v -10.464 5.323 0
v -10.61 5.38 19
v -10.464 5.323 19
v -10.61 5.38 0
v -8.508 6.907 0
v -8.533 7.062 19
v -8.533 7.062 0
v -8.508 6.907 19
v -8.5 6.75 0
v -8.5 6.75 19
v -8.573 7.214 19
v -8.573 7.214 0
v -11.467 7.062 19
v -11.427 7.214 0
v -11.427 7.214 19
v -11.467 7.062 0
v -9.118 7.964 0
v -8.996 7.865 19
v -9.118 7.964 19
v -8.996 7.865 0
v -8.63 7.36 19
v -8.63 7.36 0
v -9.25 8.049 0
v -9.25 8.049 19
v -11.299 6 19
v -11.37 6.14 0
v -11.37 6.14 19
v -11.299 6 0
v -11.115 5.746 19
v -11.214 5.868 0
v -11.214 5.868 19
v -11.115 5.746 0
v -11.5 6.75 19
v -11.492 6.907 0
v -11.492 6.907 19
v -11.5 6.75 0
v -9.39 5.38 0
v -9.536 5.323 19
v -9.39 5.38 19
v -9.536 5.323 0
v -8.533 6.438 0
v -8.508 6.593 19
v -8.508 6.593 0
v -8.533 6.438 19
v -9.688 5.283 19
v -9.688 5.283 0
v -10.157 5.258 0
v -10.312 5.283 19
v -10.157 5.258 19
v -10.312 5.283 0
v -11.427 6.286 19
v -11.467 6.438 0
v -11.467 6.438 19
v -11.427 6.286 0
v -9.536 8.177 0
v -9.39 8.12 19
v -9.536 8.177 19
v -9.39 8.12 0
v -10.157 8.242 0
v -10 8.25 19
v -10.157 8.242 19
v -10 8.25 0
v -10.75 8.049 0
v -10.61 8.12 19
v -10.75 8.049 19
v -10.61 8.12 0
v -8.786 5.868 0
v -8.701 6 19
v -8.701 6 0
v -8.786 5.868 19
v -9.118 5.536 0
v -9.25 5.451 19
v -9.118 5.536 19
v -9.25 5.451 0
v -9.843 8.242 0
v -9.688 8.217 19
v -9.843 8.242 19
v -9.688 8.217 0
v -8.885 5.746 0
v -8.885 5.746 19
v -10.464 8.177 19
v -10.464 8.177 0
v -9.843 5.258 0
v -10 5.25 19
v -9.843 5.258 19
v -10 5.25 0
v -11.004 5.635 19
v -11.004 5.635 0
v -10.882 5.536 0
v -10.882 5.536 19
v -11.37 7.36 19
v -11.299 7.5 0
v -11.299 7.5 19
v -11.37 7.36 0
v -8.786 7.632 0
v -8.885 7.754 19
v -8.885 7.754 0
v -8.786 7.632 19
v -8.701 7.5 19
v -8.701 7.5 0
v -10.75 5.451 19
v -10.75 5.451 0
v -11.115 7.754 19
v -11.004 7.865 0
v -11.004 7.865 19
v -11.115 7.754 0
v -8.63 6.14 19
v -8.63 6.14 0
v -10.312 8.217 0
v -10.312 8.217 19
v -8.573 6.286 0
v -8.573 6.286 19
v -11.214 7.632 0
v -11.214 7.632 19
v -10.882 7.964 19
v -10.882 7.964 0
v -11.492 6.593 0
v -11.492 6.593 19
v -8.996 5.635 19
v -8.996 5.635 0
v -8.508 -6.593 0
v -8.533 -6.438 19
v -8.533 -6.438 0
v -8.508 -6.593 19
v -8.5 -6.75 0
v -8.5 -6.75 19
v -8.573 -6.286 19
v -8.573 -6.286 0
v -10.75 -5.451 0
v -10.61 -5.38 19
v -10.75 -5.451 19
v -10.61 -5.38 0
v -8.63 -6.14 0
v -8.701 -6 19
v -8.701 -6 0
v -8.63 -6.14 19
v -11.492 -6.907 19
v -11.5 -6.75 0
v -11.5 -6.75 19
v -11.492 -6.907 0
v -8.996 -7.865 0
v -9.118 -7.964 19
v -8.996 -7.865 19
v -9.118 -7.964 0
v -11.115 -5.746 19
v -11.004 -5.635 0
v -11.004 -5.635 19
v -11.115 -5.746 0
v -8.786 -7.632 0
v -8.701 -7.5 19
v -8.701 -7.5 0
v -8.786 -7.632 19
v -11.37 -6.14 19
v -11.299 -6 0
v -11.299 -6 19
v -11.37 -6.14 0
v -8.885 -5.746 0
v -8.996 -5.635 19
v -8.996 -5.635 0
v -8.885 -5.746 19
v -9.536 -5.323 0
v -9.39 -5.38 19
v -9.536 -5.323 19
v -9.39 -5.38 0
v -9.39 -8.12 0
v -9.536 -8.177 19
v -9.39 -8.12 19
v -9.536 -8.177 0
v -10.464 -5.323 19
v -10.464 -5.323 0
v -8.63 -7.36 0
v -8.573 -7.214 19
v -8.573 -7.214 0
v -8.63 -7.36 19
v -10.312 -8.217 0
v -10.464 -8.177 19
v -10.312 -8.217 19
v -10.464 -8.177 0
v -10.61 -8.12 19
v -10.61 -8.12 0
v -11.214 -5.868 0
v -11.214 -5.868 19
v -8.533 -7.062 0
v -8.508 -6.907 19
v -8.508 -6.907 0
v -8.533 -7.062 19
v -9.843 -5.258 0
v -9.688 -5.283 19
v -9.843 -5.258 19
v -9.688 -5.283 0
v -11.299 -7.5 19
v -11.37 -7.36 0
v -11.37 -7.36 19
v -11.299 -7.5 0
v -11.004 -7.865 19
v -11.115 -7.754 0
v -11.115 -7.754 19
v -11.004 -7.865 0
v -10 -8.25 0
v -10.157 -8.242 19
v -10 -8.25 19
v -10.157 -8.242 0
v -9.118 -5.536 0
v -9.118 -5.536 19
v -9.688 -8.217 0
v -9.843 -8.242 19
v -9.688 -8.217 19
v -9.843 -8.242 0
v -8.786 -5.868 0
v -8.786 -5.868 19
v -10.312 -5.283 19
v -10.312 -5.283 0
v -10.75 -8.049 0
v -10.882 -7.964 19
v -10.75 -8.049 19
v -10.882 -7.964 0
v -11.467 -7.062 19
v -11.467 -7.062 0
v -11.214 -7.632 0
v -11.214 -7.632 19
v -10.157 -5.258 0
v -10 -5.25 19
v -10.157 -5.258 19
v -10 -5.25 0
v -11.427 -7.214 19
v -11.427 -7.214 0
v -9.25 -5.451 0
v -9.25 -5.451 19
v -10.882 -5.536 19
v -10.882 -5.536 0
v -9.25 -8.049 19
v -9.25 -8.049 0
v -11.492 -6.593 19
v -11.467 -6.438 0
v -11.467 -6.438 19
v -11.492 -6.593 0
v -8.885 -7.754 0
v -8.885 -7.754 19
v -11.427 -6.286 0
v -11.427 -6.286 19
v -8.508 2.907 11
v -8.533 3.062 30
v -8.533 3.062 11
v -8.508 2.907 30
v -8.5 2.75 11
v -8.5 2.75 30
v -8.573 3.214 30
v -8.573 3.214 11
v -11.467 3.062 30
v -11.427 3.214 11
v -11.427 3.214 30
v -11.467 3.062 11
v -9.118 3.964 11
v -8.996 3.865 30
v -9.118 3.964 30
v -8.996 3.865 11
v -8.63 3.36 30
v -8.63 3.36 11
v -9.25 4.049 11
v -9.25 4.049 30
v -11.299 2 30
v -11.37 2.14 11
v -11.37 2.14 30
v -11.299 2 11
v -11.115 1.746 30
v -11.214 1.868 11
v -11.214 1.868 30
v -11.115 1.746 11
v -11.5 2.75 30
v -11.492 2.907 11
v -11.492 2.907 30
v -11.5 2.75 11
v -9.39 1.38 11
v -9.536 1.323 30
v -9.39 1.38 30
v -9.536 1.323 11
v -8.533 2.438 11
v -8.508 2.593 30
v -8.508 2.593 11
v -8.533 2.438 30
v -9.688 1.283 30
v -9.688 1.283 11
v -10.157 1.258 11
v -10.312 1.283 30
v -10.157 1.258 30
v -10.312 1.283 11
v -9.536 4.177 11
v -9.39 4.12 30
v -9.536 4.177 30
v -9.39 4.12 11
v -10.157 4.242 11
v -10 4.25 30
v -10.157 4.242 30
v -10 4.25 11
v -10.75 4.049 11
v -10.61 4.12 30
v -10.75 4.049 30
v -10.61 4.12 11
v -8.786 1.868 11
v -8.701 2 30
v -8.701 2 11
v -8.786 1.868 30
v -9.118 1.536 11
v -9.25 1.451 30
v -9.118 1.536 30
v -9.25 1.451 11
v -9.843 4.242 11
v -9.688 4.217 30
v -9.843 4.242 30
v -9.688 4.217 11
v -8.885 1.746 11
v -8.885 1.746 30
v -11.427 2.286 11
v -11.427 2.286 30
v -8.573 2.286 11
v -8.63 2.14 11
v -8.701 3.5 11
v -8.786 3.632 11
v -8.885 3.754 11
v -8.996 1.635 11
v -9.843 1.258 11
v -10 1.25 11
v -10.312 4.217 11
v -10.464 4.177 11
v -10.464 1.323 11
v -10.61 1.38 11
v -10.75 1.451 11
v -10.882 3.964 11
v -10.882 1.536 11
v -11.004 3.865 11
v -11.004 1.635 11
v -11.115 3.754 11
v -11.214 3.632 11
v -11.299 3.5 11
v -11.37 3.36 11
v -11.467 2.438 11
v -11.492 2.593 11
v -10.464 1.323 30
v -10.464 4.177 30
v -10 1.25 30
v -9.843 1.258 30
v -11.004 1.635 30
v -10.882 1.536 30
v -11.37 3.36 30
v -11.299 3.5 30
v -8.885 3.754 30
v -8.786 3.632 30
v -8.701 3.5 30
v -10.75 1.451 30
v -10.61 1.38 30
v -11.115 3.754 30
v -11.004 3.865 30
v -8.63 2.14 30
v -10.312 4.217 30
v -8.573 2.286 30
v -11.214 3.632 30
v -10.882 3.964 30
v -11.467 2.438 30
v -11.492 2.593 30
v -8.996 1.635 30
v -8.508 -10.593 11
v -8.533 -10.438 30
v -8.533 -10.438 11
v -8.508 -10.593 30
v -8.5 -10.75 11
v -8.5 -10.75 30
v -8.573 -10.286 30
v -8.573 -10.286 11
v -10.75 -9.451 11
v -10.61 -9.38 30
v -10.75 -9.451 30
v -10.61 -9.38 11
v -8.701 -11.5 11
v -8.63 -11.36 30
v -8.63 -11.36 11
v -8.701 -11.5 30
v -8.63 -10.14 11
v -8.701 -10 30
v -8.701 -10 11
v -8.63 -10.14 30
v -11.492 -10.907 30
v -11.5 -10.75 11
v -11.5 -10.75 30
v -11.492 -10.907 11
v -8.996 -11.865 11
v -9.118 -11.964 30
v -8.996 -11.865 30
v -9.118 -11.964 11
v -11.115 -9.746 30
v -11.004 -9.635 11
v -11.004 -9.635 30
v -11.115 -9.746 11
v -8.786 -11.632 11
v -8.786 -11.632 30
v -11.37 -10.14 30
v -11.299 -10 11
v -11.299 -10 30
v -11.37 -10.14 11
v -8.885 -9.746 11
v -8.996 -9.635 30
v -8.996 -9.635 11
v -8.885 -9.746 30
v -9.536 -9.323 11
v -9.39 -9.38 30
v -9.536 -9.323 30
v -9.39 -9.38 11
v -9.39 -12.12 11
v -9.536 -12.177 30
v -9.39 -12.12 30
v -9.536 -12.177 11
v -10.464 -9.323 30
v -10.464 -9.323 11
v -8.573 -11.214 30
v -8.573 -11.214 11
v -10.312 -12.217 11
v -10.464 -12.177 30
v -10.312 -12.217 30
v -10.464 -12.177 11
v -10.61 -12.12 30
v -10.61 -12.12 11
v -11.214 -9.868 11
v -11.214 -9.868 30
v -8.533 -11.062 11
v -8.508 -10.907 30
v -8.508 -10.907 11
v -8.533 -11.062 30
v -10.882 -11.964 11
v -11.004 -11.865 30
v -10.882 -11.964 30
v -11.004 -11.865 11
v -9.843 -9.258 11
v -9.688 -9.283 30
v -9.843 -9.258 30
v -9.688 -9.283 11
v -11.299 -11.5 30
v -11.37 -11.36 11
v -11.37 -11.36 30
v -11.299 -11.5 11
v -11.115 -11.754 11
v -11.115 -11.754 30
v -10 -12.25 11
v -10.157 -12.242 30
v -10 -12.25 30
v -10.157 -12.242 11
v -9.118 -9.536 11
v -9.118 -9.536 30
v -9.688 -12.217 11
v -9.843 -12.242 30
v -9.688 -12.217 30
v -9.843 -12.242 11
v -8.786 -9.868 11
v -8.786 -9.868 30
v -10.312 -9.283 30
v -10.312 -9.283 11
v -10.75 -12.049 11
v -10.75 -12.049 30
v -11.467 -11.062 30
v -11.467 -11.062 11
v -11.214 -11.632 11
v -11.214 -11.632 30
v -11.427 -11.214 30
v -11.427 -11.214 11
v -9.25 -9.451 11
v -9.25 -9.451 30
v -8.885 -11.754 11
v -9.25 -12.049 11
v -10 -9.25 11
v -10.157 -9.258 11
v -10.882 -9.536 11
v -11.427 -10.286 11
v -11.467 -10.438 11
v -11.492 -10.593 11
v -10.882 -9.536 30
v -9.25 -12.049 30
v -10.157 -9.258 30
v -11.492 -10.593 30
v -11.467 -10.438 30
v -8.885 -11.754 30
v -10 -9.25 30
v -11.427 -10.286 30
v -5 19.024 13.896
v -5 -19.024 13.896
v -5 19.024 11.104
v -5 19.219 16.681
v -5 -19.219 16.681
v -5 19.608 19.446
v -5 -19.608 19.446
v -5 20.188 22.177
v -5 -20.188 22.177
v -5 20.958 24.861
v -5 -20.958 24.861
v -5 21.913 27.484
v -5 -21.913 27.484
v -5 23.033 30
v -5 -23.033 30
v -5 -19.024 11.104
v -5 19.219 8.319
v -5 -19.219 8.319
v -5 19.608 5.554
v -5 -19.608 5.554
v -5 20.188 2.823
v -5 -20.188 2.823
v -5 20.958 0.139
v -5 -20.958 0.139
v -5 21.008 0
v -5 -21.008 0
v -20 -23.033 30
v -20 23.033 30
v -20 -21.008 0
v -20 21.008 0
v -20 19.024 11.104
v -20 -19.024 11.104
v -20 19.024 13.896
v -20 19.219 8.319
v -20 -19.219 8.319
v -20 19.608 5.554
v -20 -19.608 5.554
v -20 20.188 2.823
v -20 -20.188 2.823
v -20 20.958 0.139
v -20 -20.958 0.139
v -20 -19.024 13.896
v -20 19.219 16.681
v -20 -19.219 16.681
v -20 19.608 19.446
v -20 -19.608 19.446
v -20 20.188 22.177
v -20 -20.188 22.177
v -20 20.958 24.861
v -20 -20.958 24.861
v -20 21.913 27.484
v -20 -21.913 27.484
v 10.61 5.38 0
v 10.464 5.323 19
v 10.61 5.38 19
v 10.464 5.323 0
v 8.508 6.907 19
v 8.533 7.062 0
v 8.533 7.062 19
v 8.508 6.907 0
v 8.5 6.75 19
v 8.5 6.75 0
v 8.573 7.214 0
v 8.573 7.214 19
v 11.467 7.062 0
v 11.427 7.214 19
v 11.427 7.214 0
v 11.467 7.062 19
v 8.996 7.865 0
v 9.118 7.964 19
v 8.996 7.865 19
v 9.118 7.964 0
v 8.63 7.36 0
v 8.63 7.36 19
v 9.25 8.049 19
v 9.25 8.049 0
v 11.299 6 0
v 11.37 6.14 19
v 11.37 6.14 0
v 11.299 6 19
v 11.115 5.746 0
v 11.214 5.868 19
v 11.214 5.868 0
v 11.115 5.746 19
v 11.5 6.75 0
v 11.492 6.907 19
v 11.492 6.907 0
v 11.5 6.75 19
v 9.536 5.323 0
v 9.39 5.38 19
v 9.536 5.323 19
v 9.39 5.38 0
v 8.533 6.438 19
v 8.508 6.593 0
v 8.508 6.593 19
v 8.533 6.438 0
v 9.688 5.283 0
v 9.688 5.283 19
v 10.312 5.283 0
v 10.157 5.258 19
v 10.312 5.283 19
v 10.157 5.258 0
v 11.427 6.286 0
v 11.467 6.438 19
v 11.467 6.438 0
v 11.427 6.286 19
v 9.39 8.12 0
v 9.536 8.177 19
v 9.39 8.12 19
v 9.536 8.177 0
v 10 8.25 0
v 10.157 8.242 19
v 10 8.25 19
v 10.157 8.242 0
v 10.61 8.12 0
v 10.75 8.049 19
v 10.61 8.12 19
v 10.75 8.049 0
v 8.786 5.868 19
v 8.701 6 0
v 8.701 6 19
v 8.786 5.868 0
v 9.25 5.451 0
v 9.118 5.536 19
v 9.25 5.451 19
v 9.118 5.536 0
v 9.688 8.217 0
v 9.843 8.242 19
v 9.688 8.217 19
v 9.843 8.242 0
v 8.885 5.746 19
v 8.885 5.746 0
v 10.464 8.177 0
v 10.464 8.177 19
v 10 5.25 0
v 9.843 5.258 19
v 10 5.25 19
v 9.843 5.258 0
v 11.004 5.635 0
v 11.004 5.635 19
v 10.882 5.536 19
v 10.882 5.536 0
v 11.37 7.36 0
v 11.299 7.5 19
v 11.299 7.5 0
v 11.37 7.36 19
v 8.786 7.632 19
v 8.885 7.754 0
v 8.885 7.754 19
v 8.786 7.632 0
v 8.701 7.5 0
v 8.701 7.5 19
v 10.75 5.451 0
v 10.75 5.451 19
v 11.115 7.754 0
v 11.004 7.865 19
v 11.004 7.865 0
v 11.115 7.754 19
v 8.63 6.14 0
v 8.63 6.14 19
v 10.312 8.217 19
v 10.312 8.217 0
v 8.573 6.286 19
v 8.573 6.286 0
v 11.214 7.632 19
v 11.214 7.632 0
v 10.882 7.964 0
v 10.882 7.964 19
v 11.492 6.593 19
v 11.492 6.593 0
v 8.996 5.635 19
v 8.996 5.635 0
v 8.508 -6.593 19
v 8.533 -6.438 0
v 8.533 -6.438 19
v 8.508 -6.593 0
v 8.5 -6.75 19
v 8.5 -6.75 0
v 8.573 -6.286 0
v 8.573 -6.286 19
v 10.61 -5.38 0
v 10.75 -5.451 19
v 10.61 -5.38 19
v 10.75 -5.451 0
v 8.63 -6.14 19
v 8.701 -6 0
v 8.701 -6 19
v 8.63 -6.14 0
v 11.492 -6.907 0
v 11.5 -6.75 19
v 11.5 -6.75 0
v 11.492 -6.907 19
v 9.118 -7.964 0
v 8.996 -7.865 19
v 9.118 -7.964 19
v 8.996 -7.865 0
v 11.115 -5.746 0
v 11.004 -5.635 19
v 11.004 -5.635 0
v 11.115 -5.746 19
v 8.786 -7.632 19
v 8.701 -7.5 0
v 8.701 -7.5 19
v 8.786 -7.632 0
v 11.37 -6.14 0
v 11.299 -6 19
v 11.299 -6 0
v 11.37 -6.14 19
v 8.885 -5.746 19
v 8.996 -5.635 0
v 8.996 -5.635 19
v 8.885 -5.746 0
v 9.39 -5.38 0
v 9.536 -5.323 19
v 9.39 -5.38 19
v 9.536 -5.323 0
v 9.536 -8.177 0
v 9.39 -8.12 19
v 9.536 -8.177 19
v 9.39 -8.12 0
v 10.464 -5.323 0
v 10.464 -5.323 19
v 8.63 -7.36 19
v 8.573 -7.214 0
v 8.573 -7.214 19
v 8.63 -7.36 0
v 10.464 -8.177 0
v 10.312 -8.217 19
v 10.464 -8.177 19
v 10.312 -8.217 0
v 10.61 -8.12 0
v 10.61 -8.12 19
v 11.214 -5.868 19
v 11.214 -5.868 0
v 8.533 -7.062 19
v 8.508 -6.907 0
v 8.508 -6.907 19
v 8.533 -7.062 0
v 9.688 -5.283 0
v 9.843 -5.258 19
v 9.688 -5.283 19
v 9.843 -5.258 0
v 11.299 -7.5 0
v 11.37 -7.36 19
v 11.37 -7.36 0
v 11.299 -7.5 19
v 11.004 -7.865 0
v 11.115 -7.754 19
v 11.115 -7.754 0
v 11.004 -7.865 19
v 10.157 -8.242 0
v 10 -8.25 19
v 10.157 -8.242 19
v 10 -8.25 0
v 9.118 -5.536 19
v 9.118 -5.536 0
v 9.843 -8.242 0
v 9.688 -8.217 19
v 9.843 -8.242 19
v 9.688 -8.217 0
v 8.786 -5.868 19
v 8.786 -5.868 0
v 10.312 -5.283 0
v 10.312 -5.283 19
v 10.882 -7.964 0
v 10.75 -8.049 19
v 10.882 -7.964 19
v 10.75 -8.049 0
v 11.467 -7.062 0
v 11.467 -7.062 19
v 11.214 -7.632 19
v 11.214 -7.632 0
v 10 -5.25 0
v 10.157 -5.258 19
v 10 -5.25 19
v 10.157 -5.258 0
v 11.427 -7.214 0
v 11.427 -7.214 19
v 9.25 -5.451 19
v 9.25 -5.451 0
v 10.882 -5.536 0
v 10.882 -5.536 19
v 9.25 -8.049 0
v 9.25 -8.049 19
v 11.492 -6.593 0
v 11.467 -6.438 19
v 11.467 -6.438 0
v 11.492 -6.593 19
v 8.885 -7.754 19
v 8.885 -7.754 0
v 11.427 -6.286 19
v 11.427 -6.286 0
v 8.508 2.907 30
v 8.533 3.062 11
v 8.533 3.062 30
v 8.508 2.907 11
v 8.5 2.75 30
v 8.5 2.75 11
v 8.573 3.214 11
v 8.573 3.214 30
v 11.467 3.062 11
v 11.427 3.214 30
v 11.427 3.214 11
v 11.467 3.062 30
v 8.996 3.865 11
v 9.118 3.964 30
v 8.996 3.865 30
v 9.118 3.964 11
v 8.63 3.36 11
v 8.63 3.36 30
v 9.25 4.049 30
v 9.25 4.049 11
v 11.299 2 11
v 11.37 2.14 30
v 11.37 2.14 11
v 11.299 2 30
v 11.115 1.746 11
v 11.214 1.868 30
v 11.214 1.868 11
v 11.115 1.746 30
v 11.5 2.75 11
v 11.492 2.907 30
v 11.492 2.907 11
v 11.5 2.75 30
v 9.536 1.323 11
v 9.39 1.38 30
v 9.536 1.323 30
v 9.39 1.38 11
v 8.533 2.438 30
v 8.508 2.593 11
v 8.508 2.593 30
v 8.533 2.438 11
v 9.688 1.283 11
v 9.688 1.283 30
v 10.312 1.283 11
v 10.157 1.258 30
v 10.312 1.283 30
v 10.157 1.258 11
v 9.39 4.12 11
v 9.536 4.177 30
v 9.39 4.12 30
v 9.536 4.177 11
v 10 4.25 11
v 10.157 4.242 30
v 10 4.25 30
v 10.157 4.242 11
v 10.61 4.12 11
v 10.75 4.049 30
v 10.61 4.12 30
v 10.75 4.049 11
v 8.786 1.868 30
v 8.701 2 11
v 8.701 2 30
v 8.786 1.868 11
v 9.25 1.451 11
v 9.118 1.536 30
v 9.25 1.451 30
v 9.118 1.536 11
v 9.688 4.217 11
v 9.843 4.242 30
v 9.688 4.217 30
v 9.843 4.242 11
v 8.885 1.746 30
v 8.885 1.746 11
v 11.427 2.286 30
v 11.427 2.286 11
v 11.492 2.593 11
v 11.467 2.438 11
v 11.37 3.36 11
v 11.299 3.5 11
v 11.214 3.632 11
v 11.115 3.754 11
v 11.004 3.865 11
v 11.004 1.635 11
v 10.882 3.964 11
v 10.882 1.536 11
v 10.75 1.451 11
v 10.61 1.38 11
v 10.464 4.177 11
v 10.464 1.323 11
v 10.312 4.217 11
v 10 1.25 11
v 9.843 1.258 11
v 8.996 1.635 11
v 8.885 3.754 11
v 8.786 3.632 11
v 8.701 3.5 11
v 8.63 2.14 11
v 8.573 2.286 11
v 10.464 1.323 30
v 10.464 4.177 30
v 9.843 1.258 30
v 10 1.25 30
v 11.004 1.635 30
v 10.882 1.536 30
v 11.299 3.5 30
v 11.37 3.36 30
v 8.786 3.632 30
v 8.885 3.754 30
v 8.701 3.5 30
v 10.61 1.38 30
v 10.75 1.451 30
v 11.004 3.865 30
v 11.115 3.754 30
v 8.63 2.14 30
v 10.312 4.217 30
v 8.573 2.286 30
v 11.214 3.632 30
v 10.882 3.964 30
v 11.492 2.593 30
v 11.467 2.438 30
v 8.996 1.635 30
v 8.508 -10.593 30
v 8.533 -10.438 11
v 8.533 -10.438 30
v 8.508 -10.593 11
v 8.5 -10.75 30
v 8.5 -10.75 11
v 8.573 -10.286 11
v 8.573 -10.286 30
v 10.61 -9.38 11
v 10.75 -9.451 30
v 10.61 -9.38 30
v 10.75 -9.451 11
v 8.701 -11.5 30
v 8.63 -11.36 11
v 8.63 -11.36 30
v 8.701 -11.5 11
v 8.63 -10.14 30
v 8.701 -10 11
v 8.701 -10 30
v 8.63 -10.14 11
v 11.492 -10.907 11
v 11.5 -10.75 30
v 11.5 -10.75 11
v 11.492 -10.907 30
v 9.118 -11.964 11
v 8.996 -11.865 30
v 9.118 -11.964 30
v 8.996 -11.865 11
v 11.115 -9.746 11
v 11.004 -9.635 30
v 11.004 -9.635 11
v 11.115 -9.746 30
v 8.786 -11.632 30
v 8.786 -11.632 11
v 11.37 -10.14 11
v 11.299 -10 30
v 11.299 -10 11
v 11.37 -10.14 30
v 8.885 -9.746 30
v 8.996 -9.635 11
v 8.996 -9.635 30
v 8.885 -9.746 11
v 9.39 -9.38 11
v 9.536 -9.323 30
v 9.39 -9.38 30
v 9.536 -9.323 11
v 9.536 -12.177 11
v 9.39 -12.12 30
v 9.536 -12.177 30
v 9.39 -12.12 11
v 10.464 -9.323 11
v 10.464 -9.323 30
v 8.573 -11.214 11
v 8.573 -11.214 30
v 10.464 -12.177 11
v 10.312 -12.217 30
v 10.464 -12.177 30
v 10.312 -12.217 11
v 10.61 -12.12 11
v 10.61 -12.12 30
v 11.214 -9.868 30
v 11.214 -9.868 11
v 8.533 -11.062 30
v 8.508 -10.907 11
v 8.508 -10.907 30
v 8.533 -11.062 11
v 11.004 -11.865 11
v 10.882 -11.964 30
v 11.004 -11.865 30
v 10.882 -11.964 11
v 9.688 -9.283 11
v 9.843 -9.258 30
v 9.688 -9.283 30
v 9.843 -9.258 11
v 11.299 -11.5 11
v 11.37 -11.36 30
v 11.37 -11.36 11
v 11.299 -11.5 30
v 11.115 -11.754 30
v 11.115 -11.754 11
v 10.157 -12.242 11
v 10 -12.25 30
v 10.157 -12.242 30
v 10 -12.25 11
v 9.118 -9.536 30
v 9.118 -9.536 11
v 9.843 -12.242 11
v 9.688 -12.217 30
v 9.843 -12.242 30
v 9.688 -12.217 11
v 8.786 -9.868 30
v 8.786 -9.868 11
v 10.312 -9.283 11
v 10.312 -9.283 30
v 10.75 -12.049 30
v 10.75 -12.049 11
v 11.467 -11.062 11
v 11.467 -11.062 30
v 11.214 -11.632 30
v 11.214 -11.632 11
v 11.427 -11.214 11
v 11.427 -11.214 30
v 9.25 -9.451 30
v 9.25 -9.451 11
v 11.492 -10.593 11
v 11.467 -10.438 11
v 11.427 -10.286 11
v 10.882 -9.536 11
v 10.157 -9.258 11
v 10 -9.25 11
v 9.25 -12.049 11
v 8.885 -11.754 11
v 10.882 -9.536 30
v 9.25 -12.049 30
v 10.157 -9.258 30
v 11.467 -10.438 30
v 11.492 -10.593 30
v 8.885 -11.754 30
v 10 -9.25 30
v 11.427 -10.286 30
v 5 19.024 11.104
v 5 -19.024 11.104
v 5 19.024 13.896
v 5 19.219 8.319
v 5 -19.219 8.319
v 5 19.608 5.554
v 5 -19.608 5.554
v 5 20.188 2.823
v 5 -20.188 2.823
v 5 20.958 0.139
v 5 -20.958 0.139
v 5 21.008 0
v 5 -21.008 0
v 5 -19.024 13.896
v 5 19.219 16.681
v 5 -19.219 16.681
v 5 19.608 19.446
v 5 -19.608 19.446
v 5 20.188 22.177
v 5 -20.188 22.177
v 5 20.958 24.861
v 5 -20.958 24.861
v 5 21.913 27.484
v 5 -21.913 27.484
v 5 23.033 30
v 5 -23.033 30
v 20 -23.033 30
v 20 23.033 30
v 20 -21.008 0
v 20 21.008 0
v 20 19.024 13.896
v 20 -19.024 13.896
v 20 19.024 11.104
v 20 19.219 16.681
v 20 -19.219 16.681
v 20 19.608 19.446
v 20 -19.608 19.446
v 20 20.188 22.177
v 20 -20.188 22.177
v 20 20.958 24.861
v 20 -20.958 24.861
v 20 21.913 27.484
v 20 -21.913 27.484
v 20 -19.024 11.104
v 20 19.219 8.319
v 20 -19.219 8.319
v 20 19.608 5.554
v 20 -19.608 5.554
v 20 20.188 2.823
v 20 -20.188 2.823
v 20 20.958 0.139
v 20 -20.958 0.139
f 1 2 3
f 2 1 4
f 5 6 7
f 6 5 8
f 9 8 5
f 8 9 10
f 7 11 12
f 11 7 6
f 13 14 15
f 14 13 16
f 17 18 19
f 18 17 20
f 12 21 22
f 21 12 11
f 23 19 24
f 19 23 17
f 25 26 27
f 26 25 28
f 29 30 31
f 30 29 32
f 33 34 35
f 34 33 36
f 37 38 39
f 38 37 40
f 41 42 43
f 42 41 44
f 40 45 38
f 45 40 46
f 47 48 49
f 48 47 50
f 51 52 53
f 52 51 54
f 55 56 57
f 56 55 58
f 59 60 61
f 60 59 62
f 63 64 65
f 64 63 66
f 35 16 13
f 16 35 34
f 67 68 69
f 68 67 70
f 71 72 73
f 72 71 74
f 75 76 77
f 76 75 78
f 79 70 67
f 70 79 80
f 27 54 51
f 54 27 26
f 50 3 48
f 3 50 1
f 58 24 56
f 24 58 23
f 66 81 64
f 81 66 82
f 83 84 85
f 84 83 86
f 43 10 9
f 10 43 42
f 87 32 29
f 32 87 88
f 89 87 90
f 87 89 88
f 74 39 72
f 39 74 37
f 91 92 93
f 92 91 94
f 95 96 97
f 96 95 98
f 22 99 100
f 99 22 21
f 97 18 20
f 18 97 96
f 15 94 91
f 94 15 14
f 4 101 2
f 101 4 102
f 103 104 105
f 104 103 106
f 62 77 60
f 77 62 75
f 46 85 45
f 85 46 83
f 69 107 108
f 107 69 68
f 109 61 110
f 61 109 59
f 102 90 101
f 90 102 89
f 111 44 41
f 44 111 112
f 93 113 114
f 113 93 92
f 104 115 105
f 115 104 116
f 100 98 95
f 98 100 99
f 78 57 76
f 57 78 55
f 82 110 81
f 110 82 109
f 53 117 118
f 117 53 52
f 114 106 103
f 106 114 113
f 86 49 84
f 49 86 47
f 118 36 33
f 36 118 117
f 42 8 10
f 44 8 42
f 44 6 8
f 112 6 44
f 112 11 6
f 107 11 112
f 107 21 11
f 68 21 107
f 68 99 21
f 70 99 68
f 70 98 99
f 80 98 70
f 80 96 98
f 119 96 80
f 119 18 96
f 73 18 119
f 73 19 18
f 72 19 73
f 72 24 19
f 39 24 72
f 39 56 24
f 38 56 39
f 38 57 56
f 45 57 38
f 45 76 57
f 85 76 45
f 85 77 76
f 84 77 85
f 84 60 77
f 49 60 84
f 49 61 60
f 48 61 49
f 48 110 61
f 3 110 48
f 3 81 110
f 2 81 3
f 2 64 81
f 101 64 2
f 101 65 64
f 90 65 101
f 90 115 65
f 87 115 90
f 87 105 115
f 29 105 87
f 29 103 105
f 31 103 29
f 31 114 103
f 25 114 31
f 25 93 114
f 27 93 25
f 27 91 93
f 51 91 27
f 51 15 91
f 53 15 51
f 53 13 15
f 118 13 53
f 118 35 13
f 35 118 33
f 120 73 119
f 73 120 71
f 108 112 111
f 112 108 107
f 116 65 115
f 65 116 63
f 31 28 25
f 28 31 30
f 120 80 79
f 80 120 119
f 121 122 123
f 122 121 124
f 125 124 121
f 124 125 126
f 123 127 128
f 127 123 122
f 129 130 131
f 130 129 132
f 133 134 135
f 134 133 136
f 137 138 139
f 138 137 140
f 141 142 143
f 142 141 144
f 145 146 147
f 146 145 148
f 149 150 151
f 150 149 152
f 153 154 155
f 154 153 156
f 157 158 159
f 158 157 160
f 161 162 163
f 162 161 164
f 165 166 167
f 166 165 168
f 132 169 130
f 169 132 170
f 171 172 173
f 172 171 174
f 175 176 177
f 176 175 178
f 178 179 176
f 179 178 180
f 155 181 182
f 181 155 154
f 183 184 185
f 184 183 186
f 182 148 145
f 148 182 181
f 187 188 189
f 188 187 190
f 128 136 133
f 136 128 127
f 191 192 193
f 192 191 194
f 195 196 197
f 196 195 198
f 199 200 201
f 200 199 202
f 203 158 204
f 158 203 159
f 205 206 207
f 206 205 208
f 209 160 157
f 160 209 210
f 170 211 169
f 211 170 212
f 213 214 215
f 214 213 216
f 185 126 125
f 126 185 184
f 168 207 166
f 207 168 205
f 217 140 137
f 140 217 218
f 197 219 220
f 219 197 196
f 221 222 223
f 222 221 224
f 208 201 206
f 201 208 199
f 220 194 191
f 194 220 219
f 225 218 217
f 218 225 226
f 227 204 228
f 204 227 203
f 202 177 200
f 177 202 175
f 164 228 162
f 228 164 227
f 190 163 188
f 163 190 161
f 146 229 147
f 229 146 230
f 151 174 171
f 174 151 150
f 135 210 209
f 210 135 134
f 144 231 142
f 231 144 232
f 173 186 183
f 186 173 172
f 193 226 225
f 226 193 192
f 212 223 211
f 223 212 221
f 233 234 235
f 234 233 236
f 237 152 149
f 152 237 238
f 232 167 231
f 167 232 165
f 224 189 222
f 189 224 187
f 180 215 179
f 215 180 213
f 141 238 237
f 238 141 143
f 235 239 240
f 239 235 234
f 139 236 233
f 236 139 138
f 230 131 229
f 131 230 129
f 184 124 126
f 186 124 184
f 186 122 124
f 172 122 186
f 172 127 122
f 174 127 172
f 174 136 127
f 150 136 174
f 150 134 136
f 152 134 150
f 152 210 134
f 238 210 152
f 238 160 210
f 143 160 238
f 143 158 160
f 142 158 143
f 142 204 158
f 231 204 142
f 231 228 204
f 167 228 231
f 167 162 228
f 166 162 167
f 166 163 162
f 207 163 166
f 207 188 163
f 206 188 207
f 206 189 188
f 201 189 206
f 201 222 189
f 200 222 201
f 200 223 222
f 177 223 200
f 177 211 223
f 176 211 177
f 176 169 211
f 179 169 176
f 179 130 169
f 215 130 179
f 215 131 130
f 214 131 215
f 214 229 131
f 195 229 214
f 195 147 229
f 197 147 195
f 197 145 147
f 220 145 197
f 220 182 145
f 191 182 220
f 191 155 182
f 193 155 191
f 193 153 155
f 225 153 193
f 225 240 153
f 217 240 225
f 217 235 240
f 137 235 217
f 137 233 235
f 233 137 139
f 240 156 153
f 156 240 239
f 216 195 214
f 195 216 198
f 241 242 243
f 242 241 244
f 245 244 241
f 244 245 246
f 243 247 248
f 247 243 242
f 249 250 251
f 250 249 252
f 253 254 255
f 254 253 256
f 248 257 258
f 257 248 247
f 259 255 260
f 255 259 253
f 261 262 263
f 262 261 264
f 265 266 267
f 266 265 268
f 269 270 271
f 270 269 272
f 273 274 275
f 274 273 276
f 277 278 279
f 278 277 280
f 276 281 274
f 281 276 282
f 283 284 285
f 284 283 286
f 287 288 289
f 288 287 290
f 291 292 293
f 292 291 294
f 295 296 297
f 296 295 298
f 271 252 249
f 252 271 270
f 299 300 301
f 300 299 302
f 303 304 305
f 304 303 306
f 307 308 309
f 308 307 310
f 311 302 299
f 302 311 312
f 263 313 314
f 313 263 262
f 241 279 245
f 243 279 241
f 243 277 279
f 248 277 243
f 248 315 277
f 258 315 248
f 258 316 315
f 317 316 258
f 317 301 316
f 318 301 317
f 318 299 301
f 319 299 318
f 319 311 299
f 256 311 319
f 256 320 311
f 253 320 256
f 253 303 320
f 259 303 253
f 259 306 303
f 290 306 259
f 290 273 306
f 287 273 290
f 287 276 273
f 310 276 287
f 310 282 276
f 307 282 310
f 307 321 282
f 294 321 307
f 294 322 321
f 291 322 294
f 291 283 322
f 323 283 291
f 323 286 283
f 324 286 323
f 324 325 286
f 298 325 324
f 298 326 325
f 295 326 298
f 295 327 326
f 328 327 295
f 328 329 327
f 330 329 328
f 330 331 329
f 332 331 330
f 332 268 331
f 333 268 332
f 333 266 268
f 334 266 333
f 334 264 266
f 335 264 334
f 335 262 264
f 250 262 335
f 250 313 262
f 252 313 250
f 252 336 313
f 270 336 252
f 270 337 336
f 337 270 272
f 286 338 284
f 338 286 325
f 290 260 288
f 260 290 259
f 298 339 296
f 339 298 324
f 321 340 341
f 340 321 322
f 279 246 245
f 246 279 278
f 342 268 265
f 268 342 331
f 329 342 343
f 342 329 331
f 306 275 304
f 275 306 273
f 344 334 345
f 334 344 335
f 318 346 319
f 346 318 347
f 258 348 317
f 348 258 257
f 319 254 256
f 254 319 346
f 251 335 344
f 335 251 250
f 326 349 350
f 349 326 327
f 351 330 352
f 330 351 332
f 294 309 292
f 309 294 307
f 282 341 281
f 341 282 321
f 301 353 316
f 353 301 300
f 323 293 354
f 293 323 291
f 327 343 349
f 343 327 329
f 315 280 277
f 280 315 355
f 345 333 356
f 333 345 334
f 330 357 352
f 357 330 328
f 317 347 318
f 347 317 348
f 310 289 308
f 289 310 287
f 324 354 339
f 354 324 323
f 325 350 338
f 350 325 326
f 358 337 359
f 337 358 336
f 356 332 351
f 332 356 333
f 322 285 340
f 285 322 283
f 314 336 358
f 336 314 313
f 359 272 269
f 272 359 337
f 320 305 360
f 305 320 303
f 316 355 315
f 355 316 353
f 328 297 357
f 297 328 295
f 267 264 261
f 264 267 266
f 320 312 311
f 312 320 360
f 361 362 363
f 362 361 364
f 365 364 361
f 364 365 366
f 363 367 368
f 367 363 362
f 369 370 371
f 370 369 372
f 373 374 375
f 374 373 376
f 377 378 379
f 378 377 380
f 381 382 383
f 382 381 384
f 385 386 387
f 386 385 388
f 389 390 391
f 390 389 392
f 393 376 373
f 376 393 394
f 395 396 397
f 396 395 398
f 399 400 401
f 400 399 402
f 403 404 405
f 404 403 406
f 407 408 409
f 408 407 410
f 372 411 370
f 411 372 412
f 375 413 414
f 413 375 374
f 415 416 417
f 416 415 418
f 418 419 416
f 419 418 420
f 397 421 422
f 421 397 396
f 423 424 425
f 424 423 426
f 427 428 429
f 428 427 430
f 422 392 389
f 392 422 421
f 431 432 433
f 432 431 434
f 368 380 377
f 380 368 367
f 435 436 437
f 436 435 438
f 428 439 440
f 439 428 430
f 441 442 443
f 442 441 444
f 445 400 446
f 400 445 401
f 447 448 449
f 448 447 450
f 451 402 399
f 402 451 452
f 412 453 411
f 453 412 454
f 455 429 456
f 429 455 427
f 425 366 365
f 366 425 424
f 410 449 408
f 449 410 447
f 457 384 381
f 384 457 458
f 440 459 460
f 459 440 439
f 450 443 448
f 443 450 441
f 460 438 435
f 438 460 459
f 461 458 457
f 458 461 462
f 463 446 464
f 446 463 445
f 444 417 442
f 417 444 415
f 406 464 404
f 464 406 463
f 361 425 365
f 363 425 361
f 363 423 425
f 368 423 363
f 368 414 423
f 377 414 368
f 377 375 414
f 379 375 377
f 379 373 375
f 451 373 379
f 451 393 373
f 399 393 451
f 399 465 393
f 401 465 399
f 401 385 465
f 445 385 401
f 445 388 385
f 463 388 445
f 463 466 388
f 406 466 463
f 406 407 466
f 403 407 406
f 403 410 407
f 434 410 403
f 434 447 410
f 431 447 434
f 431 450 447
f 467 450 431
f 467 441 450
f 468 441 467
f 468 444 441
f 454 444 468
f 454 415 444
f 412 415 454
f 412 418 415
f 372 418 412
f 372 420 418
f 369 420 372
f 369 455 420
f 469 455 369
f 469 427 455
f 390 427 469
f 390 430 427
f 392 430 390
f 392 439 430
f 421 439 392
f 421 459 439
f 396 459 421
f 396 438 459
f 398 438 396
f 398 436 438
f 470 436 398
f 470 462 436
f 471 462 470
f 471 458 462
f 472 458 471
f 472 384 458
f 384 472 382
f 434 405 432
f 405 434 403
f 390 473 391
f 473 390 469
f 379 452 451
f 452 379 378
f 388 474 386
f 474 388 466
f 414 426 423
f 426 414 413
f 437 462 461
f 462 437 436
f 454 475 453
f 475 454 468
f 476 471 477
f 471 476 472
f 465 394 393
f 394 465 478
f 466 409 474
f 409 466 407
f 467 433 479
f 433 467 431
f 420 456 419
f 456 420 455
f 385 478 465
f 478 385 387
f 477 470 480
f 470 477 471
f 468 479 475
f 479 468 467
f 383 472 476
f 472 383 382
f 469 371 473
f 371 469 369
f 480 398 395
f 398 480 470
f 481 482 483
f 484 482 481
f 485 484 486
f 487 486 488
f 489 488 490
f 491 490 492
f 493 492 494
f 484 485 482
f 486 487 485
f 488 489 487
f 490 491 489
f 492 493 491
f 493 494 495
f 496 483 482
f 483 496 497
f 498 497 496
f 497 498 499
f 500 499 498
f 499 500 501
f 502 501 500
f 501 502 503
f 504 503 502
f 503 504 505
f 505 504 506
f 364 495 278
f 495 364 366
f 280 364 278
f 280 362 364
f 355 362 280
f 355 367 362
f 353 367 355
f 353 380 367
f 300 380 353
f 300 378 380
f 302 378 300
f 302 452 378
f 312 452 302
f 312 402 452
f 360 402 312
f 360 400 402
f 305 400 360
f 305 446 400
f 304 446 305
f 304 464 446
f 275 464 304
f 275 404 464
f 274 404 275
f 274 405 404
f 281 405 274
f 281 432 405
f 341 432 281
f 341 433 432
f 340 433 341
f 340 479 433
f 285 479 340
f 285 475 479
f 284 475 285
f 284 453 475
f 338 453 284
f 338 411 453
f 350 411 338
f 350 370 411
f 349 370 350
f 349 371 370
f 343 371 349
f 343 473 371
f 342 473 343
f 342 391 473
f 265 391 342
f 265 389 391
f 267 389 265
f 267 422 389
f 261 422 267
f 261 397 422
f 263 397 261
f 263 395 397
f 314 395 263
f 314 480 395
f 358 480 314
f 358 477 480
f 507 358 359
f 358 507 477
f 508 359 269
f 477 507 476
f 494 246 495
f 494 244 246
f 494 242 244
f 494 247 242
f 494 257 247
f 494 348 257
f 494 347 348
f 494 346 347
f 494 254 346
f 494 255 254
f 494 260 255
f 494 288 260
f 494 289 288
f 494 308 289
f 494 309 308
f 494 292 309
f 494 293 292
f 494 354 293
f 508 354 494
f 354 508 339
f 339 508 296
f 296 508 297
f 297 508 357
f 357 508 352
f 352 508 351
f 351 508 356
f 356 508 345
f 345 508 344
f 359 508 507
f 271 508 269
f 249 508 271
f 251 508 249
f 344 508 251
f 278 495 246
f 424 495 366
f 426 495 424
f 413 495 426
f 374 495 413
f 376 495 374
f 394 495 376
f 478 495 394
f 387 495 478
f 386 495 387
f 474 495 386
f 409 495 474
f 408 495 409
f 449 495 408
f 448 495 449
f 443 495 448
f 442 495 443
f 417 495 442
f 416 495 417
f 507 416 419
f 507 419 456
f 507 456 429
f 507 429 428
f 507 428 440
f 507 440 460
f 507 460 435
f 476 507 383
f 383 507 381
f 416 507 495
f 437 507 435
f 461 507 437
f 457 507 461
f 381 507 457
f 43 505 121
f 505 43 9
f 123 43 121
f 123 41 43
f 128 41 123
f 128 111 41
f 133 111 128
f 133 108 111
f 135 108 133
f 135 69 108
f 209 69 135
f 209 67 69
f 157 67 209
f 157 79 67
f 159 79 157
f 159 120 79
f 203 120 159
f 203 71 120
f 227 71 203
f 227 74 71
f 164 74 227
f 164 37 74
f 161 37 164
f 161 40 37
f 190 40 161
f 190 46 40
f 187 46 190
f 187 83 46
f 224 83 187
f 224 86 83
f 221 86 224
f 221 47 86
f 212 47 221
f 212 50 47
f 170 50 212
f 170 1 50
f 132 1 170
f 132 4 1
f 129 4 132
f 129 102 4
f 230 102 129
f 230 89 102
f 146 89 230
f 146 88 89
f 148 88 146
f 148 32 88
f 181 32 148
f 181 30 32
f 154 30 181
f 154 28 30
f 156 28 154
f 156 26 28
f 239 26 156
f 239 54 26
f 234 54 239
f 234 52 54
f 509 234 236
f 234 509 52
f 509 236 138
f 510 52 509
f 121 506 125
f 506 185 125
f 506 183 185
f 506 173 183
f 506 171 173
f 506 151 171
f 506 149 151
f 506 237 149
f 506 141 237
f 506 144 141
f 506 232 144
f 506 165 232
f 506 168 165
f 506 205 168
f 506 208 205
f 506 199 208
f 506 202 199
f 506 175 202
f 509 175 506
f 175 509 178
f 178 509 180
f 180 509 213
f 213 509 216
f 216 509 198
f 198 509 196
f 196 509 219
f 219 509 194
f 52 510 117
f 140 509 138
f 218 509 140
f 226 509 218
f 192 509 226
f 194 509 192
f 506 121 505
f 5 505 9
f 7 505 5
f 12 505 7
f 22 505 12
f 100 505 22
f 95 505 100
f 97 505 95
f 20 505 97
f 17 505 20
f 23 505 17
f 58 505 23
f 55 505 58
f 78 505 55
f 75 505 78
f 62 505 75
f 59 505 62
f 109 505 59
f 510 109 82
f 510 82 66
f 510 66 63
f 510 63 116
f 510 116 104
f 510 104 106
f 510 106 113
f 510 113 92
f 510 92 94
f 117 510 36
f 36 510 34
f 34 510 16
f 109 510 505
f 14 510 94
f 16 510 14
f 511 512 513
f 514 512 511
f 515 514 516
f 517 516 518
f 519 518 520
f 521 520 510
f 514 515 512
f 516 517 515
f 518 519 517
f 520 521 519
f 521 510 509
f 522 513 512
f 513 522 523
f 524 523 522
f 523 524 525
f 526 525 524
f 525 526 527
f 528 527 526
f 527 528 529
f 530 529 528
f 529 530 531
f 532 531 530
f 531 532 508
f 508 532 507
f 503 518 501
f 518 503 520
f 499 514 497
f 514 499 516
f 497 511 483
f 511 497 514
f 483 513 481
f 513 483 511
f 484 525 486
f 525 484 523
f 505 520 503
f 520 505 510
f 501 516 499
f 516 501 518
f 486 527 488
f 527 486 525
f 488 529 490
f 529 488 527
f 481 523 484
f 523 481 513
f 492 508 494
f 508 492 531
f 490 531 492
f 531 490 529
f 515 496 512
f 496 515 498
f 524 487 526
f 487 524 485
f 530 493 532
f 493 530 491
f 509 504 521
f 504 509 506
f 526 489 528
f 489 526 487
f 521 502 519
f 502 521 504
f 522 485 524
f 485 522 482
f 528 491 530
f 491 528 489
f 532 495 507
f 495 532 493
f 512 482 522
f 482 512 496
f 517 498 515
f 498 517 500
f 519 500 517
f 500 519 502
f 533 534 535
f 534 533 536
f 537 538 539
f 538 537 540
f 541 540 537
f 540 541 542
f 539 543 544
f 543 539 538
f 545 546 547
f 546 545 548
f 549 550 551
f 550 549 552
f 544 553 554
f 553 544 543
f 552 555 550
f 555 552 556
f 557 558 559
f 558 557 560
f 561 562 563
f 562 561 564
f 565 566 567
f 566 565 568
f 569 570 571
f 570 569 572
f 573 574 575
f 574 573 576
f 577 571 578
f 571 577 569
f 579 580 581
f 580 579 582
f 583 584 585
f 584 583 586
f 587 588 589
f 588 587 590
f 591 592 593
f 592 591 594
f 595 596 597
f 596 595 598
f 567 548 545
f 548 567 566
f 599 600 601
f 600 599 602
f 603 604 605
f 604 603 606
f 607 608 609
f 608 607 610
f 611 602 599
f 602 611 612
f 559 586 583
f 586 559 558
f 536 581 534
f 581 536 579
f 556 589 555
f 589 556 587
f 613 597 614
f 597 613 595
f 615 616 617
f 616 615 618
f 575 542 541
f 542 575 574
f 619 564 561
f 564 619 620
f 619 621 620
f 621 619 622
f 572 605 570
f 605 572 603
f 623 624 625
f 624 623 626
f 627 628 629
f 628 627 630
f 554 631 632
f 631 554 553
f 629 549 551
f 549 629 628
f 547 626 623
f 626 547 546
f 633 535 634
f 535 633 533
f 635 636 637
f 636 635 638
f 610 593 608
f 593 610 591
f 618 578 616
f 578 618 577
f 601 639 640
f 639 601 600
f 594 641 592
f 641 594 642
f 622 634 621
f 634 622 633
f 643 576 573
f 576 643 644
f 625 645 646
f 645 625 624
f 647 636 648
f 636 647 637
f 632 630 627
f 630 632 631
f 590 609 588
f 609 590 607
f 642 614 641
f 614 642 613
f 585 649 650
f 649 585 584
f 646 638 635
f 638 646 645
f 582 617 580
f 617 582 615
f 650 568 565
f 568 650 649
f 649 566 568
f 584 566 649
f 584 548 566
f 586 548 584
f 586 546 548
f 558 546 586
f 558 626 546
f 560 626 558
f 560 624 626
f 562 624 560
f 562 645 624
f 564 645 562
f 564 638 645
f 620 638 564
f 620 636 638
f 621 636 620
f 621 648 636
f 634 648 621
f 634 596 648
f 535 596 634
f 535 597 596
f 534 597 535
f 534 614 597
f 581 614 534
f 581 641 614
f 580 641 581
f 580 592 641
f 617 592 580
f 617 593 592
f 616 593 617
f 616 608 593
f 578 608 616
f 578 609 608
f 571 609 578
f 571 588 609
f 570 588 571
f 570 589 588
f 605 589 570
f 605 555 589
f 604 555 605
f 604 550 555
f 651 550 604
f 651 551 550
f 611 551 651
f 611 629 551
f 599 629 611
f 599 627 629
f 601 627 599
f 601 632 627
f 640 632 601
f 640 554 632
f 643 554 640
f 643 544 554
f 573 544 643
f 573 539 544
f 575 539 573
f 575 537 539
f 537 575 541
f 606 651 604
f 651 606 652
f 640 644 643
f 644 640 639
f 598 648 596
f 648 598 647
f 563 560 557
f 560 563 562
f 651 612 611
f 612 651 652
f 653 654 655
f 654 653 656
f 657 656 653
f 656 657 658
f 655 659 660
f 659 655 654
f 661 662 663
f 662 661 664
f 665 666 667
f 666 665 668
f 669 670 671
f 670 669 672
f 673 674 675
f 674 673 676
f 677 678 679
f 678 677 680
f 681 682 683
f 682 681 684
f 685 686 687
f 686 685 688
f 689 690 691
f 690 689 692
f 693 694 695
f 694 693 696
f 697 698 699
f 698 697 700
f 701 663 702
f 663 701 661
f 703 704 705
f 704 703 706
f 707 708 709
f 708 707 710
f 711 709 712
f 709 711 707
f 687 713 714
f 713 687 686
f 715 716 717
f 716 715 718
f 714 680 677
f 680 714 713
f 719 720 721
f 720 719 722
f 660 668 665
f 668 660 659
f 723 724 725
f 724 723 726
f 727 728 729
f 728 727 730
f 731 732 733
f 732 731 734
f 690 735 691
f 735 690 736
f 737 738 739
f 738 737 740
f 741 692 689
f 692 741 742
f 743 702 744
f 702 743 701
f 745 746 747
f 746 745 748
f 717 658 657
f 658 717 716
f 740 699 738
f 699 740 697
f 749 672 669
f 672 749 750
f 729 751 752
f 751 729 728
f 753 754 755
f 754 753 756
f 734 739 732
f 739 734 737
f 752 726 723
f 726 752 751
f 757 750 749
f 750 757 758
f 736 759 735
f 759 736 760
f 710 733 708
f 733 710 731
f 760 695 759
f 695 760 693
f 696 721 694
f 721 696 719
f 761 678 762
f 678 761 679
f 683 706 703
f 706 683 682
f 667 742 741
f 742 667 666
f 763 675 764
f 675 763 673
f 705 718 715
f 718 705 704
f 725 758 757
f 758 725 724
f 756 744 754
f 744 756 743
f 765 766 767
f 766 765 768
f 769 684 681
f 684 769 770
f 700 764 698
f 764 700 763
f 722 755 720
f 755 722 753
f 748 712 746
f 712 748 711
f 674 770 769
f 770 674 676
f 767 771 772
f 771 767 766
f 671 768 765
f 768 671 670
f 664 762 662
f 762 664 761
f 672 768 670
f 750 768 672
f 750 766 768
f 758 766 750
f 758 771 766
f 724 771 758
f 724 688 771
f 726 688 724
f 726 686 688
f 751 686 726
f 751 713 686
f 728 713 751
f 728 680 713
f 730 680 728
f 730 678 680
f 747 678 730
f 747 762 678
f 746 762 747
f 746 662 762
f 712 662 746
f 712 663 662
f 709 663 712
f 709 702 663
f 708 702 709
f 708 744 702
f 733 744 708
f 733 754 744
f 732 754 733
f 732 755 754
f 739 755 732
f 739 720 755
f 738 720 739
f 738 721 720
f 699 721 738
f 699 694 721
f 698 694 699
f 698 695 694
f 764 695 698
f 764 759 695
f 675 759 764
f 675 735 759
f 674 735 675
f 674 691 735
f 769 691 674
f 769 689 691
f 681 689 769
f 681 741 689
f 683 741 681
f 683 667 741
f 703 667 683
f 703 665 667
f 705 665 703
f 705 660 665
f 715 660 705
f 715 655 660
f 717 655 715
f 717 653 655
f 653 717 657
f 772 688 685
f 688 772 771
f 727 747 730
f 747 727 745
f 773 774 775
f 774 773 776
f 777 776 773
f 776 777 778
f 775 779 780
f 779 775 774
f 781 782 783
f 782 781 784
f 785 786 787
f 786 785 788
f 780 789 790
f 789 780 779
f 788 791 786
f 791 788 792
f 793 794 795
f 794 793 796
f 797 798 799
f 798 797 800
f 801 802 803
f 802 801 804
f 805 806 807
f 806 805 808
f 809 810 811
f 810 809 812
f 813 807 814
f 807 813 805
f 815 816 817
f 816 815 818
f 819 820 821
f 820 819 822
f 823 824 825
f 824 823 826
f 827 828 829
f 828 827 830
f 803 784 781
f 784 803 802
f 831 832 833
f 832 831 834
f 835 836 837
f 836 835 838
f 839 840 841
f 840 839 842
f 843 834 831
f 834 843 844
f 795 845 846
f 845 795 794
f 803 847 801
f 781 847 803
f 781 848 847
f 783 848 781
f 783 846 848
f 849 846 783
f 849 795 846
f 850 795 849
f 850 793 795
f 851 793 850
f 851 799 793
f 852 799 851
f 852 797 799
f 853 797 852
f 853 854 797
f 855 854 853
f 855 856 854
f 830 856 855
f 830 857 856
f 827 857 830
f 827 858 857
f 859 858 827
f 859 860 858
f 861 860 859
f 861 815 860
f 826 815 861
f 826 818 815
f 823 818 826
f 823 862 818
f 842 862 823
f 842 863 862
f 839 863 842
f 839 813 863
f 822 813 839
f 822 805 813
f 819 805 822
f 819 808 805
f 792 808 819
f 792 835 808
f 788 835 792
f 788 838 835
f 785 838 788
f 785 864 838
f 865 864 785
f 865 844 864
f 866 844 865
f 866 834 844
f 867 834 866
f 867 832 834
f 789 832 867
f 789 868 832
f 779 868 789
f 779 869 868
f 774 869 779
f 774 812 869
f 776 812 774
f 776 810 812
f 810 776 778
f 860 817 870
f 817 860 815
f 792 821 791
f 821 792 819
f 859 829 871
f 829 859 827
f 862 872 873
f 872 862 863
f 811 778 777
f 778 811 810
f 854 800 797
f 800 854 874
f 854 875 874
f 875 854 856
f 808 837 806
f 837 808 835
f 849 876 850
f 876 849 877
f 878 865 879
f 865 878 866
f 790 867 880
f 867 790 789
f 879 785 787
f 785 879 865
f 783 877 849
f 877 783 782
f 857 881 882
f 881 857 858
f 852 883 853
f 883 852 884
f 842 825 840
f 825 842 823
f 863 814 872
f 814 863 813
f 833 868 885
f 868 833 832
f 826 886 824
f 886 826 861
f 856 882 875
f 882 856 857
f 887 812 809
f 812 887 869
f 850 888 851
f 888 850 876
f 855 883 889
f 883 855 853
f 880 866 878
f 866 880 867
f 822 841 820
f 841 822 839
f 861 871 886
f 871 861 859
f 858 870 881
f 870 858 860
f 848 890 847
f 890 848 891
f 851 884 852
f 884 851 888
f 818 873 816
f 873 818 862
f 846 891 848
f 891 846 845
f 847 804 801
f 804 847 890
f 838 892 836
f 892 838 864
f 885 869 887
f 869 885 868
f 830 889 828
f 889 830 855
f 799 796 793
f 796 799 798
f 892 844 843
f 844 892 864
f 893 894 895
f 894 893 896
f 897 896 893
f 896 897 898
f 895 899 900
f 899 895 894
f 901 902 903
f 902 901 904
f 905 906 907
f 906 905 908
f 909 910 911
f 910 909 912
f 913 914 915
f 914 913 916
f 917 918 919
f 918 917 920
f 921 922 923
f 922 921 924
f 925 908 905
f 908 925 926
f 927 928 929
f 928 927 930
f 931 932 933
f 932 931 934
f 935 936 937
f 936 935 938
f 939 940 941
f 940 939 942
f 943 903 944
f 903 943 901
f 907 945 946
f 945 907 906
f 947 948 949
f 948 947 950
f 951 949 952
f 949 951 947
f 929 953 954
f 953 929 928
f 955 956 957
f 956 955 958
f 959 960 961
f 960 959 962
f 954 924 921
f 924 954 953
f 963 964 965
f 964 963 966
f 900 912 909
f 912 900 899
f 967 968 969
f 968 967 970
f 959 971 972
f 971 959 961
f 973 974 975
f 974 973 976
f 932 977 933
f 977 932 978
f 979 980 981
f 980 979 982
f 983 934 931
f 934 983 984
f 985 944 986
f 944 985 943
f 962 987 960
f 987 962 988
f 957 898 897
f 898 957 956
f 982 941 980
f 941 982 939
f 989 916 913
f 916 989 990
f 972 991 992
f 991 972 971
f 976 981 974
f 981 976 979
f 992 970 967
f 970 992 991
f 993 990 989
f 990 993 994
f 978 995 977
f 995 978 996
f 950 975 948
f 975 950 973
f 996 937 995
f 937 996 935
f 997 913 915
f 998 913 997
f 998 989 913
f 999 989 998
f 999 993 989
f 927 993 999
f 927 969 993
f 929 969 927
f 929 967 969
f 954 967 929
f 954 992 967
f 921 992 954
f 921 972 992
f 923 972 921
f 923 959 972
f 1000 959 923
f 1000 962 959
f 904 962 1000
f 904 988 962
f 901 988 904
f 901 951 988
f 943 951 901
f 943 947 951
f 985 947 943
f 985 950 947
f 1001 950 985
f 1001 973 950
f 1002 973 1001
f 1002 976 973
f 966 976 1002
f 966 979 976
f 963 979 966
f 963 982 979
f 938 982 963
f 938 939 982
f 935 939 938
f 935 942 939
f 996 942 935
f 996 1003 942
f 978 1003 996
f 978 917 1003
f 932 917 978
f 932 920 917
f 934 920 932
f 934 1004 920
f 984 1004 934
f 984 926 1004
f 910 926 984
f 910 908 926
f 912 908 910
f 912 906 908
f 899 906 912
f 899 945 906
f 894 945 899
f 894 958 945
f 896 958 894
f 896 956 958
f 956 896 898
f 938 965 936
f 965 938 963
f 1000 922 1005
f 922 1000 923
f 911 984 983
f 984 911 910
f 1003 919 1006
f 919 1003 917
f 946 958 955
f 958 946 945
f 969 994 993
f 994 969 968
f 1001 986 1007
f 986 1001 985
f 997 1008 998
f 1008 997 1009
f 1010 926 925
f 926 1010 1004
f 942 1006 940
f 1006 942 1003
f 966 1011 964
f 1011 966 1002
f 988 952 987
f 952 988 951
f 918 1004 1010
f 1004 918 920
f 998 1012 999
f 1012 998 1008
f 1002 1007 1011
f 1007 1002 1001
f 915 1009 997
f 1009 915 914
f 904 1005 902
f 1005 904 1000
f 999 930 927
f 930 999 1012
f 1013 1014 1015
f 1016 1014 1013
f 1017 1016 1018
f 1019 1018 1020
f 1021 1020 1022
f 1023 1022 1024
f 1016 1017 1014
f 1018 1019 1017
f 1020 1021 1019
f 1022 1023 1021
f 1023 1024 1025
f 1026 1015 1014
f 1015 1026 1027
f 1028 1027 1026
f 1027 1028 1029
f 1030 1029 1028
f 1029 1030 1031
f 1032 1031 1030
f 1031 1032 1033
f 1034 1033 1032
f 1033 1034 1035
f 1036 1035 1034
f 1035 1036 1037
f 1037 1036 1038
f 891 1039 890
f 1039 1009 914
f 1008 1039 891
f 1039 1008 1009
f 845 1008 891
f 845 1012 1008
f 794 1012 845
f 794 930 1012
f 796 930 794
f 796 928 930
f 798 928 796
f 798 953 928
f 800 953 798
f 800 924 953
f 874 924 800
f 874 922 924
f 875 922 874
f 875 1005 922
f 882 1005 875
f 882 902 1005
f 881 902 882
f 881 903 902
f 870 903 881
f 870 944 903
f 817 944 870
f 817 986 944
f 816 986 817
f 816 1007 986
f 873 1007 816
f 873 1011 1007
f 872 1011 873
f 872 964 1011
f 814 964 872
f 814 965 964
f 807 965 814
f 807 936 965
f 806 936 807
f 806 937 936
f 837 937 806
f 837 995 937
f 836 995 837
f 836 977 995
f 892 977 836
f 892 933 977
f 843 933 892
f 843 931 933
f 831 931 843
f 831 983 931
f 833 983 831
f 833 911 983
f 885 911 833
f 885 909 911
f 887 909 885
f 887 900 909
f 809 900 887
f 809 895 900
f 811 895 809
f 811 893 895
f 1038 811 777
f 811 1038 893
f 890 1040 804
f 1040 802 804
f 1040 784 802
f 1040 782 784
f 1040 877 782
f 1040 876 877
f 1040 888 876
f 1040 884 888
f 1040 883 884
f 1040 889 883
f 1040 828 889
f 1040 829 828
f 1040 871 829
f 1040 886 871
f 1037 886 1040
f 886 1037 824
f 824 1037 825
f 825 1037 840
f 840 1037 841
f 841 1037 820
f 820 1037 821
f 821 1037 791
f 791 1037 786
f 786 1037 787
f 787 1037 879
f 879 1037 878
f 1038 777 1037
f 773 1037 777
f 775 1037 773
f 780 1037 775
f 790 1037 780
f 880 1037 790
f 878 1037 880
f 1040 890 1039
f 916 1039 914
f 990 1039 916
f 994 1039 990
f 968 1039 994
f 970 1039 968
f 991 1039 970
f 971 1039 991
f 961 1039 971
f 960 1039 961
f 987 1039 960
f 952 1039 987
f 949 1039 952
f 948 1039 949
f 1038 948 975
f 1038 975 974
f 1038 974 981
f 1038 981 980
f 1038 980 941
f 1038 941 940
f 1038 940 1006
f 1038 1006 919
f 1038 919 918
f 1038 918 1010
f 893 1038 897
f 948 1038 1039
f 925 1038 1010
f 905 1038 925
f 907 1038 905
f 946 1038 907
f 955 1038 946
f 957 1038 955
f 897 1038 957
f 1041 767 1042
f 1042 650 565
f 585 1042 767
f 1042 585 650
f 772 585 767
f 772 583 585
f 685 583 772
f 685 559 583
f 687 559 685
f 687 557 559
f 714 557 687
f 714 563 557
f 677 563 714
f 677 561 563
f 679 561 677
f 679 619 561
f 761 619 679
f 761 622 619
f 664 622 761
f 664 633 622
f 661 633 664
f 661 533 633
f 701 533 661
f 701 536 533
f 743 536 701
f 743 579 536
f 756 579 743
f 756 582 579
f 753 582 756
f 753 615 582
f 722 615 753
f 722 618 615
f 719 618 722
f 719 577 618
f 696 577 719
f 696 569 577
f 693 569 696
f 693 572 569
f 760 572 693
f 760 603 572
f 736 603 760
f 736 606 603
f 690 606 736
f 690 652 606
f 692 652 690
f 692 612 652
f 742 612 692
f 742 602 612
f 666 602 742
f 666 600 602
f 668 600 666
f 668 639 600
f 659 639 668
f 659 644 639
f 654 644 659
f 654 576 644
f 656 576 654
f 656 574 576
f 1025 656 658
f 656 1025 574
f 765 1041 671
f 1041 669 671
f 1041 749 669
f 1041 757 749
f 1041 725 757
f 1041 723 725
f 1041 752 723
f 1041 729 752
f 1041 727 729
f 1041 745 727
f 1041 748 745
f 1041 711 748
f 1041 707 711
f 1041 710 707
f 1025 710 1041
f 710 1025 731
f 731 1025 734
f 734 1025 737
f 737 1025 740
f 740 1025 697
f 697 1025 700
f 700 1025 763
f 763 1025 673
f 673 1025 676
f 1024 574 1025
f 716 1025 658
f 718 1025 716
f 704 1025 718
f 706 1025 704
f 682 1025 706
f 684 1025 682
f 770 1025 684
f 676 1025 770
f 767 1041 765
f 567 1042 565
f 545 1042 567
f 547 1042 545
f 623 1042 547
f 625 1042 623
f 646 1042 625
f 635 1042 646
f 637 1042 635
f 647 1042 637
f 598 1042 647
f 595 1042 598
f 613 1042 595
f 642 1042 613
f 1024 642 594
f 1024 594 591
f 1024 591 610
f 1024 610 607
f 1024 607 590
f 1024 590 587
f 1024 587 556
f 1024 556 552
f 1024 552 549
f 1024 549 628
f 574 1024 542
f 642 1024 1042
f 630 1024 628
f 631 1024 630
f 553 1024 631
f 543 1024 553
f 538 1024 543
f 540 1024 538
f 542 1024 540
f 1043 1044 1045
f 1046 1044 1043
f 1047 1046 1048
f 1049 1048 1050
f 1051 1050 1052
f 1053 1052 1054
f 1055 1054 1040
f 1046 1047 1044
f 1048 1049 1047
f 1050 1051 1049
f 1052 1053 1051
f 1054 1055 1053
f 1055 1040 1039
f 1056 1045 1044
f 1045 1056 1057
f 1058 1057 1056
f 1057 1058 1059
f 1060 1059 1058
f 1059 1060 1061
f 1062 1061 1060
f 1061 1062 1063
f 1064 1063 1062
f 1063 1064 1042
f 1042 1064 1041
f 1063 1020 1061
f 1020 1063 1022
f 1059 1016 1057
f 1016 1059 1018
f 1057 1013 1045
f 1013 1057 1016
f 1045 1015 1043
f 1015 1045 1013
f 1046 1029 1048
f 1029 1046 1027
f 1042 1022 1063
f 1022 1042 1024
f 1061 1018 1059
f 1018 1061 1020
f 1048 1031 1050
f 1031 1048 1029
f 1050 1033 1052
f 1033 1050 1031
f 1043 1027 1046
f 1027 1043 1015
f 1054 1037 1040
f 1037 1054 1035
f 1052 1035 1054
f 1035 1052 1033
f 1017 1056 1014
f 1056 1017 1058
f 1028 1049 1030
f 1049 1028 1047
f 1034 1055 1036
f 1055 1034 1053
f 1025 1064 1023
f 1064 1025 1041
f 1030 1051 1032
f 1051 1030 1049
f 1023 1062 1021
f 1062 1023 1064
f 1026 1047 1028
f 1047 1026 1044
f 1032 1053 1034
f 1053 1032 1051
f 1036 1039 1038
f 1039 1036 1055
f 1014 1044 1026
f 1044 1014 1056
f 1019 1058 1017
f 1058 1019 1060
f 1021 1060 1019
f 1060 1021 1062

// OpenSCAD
H = 30;
dv1 = 3;
hv1 = 9;
hv2 = 19;
e = 4;
alpha = atan(e/H);

W = 15;

gearD = 118;

module support() 
translate([-W-5,0,0])
difference() {
	// pièce
	translate([0,-gearD/2-e,0]) cube([W,gearD,H]);
	
	// gear 1
	translate([-1, gearD/2, 12.5]) rotate([0, 90, 0]) cylinder(h=W+2, r=40, $fn=90);

	// gear 1
	translate([-1, -gearD/2, 12.5]) rotate([0, 90, 0]) cylinder(h=W+2, r=40, $fn=90);
	
	// vis
	# color("red") {
		translate([10, 13.5/2, -1]) cylinder(h=hv2+1,d=dv1,$fn=60);
		translate([10, -13.5/2, -1]) cylinder(h=hv2+1,d=dv1,$fn=60);
		
		translate([10, 13.5/2-e, H-hv2]) cylinder(h=hv2+1,d=dv1,$fn=60);
		translate([10, -13.5/2-e, H-hv2]) cylinder(h=hv2+1,d=dv1,$fn=60);
	}
}

support();

mirror([1,0,0]) support();
